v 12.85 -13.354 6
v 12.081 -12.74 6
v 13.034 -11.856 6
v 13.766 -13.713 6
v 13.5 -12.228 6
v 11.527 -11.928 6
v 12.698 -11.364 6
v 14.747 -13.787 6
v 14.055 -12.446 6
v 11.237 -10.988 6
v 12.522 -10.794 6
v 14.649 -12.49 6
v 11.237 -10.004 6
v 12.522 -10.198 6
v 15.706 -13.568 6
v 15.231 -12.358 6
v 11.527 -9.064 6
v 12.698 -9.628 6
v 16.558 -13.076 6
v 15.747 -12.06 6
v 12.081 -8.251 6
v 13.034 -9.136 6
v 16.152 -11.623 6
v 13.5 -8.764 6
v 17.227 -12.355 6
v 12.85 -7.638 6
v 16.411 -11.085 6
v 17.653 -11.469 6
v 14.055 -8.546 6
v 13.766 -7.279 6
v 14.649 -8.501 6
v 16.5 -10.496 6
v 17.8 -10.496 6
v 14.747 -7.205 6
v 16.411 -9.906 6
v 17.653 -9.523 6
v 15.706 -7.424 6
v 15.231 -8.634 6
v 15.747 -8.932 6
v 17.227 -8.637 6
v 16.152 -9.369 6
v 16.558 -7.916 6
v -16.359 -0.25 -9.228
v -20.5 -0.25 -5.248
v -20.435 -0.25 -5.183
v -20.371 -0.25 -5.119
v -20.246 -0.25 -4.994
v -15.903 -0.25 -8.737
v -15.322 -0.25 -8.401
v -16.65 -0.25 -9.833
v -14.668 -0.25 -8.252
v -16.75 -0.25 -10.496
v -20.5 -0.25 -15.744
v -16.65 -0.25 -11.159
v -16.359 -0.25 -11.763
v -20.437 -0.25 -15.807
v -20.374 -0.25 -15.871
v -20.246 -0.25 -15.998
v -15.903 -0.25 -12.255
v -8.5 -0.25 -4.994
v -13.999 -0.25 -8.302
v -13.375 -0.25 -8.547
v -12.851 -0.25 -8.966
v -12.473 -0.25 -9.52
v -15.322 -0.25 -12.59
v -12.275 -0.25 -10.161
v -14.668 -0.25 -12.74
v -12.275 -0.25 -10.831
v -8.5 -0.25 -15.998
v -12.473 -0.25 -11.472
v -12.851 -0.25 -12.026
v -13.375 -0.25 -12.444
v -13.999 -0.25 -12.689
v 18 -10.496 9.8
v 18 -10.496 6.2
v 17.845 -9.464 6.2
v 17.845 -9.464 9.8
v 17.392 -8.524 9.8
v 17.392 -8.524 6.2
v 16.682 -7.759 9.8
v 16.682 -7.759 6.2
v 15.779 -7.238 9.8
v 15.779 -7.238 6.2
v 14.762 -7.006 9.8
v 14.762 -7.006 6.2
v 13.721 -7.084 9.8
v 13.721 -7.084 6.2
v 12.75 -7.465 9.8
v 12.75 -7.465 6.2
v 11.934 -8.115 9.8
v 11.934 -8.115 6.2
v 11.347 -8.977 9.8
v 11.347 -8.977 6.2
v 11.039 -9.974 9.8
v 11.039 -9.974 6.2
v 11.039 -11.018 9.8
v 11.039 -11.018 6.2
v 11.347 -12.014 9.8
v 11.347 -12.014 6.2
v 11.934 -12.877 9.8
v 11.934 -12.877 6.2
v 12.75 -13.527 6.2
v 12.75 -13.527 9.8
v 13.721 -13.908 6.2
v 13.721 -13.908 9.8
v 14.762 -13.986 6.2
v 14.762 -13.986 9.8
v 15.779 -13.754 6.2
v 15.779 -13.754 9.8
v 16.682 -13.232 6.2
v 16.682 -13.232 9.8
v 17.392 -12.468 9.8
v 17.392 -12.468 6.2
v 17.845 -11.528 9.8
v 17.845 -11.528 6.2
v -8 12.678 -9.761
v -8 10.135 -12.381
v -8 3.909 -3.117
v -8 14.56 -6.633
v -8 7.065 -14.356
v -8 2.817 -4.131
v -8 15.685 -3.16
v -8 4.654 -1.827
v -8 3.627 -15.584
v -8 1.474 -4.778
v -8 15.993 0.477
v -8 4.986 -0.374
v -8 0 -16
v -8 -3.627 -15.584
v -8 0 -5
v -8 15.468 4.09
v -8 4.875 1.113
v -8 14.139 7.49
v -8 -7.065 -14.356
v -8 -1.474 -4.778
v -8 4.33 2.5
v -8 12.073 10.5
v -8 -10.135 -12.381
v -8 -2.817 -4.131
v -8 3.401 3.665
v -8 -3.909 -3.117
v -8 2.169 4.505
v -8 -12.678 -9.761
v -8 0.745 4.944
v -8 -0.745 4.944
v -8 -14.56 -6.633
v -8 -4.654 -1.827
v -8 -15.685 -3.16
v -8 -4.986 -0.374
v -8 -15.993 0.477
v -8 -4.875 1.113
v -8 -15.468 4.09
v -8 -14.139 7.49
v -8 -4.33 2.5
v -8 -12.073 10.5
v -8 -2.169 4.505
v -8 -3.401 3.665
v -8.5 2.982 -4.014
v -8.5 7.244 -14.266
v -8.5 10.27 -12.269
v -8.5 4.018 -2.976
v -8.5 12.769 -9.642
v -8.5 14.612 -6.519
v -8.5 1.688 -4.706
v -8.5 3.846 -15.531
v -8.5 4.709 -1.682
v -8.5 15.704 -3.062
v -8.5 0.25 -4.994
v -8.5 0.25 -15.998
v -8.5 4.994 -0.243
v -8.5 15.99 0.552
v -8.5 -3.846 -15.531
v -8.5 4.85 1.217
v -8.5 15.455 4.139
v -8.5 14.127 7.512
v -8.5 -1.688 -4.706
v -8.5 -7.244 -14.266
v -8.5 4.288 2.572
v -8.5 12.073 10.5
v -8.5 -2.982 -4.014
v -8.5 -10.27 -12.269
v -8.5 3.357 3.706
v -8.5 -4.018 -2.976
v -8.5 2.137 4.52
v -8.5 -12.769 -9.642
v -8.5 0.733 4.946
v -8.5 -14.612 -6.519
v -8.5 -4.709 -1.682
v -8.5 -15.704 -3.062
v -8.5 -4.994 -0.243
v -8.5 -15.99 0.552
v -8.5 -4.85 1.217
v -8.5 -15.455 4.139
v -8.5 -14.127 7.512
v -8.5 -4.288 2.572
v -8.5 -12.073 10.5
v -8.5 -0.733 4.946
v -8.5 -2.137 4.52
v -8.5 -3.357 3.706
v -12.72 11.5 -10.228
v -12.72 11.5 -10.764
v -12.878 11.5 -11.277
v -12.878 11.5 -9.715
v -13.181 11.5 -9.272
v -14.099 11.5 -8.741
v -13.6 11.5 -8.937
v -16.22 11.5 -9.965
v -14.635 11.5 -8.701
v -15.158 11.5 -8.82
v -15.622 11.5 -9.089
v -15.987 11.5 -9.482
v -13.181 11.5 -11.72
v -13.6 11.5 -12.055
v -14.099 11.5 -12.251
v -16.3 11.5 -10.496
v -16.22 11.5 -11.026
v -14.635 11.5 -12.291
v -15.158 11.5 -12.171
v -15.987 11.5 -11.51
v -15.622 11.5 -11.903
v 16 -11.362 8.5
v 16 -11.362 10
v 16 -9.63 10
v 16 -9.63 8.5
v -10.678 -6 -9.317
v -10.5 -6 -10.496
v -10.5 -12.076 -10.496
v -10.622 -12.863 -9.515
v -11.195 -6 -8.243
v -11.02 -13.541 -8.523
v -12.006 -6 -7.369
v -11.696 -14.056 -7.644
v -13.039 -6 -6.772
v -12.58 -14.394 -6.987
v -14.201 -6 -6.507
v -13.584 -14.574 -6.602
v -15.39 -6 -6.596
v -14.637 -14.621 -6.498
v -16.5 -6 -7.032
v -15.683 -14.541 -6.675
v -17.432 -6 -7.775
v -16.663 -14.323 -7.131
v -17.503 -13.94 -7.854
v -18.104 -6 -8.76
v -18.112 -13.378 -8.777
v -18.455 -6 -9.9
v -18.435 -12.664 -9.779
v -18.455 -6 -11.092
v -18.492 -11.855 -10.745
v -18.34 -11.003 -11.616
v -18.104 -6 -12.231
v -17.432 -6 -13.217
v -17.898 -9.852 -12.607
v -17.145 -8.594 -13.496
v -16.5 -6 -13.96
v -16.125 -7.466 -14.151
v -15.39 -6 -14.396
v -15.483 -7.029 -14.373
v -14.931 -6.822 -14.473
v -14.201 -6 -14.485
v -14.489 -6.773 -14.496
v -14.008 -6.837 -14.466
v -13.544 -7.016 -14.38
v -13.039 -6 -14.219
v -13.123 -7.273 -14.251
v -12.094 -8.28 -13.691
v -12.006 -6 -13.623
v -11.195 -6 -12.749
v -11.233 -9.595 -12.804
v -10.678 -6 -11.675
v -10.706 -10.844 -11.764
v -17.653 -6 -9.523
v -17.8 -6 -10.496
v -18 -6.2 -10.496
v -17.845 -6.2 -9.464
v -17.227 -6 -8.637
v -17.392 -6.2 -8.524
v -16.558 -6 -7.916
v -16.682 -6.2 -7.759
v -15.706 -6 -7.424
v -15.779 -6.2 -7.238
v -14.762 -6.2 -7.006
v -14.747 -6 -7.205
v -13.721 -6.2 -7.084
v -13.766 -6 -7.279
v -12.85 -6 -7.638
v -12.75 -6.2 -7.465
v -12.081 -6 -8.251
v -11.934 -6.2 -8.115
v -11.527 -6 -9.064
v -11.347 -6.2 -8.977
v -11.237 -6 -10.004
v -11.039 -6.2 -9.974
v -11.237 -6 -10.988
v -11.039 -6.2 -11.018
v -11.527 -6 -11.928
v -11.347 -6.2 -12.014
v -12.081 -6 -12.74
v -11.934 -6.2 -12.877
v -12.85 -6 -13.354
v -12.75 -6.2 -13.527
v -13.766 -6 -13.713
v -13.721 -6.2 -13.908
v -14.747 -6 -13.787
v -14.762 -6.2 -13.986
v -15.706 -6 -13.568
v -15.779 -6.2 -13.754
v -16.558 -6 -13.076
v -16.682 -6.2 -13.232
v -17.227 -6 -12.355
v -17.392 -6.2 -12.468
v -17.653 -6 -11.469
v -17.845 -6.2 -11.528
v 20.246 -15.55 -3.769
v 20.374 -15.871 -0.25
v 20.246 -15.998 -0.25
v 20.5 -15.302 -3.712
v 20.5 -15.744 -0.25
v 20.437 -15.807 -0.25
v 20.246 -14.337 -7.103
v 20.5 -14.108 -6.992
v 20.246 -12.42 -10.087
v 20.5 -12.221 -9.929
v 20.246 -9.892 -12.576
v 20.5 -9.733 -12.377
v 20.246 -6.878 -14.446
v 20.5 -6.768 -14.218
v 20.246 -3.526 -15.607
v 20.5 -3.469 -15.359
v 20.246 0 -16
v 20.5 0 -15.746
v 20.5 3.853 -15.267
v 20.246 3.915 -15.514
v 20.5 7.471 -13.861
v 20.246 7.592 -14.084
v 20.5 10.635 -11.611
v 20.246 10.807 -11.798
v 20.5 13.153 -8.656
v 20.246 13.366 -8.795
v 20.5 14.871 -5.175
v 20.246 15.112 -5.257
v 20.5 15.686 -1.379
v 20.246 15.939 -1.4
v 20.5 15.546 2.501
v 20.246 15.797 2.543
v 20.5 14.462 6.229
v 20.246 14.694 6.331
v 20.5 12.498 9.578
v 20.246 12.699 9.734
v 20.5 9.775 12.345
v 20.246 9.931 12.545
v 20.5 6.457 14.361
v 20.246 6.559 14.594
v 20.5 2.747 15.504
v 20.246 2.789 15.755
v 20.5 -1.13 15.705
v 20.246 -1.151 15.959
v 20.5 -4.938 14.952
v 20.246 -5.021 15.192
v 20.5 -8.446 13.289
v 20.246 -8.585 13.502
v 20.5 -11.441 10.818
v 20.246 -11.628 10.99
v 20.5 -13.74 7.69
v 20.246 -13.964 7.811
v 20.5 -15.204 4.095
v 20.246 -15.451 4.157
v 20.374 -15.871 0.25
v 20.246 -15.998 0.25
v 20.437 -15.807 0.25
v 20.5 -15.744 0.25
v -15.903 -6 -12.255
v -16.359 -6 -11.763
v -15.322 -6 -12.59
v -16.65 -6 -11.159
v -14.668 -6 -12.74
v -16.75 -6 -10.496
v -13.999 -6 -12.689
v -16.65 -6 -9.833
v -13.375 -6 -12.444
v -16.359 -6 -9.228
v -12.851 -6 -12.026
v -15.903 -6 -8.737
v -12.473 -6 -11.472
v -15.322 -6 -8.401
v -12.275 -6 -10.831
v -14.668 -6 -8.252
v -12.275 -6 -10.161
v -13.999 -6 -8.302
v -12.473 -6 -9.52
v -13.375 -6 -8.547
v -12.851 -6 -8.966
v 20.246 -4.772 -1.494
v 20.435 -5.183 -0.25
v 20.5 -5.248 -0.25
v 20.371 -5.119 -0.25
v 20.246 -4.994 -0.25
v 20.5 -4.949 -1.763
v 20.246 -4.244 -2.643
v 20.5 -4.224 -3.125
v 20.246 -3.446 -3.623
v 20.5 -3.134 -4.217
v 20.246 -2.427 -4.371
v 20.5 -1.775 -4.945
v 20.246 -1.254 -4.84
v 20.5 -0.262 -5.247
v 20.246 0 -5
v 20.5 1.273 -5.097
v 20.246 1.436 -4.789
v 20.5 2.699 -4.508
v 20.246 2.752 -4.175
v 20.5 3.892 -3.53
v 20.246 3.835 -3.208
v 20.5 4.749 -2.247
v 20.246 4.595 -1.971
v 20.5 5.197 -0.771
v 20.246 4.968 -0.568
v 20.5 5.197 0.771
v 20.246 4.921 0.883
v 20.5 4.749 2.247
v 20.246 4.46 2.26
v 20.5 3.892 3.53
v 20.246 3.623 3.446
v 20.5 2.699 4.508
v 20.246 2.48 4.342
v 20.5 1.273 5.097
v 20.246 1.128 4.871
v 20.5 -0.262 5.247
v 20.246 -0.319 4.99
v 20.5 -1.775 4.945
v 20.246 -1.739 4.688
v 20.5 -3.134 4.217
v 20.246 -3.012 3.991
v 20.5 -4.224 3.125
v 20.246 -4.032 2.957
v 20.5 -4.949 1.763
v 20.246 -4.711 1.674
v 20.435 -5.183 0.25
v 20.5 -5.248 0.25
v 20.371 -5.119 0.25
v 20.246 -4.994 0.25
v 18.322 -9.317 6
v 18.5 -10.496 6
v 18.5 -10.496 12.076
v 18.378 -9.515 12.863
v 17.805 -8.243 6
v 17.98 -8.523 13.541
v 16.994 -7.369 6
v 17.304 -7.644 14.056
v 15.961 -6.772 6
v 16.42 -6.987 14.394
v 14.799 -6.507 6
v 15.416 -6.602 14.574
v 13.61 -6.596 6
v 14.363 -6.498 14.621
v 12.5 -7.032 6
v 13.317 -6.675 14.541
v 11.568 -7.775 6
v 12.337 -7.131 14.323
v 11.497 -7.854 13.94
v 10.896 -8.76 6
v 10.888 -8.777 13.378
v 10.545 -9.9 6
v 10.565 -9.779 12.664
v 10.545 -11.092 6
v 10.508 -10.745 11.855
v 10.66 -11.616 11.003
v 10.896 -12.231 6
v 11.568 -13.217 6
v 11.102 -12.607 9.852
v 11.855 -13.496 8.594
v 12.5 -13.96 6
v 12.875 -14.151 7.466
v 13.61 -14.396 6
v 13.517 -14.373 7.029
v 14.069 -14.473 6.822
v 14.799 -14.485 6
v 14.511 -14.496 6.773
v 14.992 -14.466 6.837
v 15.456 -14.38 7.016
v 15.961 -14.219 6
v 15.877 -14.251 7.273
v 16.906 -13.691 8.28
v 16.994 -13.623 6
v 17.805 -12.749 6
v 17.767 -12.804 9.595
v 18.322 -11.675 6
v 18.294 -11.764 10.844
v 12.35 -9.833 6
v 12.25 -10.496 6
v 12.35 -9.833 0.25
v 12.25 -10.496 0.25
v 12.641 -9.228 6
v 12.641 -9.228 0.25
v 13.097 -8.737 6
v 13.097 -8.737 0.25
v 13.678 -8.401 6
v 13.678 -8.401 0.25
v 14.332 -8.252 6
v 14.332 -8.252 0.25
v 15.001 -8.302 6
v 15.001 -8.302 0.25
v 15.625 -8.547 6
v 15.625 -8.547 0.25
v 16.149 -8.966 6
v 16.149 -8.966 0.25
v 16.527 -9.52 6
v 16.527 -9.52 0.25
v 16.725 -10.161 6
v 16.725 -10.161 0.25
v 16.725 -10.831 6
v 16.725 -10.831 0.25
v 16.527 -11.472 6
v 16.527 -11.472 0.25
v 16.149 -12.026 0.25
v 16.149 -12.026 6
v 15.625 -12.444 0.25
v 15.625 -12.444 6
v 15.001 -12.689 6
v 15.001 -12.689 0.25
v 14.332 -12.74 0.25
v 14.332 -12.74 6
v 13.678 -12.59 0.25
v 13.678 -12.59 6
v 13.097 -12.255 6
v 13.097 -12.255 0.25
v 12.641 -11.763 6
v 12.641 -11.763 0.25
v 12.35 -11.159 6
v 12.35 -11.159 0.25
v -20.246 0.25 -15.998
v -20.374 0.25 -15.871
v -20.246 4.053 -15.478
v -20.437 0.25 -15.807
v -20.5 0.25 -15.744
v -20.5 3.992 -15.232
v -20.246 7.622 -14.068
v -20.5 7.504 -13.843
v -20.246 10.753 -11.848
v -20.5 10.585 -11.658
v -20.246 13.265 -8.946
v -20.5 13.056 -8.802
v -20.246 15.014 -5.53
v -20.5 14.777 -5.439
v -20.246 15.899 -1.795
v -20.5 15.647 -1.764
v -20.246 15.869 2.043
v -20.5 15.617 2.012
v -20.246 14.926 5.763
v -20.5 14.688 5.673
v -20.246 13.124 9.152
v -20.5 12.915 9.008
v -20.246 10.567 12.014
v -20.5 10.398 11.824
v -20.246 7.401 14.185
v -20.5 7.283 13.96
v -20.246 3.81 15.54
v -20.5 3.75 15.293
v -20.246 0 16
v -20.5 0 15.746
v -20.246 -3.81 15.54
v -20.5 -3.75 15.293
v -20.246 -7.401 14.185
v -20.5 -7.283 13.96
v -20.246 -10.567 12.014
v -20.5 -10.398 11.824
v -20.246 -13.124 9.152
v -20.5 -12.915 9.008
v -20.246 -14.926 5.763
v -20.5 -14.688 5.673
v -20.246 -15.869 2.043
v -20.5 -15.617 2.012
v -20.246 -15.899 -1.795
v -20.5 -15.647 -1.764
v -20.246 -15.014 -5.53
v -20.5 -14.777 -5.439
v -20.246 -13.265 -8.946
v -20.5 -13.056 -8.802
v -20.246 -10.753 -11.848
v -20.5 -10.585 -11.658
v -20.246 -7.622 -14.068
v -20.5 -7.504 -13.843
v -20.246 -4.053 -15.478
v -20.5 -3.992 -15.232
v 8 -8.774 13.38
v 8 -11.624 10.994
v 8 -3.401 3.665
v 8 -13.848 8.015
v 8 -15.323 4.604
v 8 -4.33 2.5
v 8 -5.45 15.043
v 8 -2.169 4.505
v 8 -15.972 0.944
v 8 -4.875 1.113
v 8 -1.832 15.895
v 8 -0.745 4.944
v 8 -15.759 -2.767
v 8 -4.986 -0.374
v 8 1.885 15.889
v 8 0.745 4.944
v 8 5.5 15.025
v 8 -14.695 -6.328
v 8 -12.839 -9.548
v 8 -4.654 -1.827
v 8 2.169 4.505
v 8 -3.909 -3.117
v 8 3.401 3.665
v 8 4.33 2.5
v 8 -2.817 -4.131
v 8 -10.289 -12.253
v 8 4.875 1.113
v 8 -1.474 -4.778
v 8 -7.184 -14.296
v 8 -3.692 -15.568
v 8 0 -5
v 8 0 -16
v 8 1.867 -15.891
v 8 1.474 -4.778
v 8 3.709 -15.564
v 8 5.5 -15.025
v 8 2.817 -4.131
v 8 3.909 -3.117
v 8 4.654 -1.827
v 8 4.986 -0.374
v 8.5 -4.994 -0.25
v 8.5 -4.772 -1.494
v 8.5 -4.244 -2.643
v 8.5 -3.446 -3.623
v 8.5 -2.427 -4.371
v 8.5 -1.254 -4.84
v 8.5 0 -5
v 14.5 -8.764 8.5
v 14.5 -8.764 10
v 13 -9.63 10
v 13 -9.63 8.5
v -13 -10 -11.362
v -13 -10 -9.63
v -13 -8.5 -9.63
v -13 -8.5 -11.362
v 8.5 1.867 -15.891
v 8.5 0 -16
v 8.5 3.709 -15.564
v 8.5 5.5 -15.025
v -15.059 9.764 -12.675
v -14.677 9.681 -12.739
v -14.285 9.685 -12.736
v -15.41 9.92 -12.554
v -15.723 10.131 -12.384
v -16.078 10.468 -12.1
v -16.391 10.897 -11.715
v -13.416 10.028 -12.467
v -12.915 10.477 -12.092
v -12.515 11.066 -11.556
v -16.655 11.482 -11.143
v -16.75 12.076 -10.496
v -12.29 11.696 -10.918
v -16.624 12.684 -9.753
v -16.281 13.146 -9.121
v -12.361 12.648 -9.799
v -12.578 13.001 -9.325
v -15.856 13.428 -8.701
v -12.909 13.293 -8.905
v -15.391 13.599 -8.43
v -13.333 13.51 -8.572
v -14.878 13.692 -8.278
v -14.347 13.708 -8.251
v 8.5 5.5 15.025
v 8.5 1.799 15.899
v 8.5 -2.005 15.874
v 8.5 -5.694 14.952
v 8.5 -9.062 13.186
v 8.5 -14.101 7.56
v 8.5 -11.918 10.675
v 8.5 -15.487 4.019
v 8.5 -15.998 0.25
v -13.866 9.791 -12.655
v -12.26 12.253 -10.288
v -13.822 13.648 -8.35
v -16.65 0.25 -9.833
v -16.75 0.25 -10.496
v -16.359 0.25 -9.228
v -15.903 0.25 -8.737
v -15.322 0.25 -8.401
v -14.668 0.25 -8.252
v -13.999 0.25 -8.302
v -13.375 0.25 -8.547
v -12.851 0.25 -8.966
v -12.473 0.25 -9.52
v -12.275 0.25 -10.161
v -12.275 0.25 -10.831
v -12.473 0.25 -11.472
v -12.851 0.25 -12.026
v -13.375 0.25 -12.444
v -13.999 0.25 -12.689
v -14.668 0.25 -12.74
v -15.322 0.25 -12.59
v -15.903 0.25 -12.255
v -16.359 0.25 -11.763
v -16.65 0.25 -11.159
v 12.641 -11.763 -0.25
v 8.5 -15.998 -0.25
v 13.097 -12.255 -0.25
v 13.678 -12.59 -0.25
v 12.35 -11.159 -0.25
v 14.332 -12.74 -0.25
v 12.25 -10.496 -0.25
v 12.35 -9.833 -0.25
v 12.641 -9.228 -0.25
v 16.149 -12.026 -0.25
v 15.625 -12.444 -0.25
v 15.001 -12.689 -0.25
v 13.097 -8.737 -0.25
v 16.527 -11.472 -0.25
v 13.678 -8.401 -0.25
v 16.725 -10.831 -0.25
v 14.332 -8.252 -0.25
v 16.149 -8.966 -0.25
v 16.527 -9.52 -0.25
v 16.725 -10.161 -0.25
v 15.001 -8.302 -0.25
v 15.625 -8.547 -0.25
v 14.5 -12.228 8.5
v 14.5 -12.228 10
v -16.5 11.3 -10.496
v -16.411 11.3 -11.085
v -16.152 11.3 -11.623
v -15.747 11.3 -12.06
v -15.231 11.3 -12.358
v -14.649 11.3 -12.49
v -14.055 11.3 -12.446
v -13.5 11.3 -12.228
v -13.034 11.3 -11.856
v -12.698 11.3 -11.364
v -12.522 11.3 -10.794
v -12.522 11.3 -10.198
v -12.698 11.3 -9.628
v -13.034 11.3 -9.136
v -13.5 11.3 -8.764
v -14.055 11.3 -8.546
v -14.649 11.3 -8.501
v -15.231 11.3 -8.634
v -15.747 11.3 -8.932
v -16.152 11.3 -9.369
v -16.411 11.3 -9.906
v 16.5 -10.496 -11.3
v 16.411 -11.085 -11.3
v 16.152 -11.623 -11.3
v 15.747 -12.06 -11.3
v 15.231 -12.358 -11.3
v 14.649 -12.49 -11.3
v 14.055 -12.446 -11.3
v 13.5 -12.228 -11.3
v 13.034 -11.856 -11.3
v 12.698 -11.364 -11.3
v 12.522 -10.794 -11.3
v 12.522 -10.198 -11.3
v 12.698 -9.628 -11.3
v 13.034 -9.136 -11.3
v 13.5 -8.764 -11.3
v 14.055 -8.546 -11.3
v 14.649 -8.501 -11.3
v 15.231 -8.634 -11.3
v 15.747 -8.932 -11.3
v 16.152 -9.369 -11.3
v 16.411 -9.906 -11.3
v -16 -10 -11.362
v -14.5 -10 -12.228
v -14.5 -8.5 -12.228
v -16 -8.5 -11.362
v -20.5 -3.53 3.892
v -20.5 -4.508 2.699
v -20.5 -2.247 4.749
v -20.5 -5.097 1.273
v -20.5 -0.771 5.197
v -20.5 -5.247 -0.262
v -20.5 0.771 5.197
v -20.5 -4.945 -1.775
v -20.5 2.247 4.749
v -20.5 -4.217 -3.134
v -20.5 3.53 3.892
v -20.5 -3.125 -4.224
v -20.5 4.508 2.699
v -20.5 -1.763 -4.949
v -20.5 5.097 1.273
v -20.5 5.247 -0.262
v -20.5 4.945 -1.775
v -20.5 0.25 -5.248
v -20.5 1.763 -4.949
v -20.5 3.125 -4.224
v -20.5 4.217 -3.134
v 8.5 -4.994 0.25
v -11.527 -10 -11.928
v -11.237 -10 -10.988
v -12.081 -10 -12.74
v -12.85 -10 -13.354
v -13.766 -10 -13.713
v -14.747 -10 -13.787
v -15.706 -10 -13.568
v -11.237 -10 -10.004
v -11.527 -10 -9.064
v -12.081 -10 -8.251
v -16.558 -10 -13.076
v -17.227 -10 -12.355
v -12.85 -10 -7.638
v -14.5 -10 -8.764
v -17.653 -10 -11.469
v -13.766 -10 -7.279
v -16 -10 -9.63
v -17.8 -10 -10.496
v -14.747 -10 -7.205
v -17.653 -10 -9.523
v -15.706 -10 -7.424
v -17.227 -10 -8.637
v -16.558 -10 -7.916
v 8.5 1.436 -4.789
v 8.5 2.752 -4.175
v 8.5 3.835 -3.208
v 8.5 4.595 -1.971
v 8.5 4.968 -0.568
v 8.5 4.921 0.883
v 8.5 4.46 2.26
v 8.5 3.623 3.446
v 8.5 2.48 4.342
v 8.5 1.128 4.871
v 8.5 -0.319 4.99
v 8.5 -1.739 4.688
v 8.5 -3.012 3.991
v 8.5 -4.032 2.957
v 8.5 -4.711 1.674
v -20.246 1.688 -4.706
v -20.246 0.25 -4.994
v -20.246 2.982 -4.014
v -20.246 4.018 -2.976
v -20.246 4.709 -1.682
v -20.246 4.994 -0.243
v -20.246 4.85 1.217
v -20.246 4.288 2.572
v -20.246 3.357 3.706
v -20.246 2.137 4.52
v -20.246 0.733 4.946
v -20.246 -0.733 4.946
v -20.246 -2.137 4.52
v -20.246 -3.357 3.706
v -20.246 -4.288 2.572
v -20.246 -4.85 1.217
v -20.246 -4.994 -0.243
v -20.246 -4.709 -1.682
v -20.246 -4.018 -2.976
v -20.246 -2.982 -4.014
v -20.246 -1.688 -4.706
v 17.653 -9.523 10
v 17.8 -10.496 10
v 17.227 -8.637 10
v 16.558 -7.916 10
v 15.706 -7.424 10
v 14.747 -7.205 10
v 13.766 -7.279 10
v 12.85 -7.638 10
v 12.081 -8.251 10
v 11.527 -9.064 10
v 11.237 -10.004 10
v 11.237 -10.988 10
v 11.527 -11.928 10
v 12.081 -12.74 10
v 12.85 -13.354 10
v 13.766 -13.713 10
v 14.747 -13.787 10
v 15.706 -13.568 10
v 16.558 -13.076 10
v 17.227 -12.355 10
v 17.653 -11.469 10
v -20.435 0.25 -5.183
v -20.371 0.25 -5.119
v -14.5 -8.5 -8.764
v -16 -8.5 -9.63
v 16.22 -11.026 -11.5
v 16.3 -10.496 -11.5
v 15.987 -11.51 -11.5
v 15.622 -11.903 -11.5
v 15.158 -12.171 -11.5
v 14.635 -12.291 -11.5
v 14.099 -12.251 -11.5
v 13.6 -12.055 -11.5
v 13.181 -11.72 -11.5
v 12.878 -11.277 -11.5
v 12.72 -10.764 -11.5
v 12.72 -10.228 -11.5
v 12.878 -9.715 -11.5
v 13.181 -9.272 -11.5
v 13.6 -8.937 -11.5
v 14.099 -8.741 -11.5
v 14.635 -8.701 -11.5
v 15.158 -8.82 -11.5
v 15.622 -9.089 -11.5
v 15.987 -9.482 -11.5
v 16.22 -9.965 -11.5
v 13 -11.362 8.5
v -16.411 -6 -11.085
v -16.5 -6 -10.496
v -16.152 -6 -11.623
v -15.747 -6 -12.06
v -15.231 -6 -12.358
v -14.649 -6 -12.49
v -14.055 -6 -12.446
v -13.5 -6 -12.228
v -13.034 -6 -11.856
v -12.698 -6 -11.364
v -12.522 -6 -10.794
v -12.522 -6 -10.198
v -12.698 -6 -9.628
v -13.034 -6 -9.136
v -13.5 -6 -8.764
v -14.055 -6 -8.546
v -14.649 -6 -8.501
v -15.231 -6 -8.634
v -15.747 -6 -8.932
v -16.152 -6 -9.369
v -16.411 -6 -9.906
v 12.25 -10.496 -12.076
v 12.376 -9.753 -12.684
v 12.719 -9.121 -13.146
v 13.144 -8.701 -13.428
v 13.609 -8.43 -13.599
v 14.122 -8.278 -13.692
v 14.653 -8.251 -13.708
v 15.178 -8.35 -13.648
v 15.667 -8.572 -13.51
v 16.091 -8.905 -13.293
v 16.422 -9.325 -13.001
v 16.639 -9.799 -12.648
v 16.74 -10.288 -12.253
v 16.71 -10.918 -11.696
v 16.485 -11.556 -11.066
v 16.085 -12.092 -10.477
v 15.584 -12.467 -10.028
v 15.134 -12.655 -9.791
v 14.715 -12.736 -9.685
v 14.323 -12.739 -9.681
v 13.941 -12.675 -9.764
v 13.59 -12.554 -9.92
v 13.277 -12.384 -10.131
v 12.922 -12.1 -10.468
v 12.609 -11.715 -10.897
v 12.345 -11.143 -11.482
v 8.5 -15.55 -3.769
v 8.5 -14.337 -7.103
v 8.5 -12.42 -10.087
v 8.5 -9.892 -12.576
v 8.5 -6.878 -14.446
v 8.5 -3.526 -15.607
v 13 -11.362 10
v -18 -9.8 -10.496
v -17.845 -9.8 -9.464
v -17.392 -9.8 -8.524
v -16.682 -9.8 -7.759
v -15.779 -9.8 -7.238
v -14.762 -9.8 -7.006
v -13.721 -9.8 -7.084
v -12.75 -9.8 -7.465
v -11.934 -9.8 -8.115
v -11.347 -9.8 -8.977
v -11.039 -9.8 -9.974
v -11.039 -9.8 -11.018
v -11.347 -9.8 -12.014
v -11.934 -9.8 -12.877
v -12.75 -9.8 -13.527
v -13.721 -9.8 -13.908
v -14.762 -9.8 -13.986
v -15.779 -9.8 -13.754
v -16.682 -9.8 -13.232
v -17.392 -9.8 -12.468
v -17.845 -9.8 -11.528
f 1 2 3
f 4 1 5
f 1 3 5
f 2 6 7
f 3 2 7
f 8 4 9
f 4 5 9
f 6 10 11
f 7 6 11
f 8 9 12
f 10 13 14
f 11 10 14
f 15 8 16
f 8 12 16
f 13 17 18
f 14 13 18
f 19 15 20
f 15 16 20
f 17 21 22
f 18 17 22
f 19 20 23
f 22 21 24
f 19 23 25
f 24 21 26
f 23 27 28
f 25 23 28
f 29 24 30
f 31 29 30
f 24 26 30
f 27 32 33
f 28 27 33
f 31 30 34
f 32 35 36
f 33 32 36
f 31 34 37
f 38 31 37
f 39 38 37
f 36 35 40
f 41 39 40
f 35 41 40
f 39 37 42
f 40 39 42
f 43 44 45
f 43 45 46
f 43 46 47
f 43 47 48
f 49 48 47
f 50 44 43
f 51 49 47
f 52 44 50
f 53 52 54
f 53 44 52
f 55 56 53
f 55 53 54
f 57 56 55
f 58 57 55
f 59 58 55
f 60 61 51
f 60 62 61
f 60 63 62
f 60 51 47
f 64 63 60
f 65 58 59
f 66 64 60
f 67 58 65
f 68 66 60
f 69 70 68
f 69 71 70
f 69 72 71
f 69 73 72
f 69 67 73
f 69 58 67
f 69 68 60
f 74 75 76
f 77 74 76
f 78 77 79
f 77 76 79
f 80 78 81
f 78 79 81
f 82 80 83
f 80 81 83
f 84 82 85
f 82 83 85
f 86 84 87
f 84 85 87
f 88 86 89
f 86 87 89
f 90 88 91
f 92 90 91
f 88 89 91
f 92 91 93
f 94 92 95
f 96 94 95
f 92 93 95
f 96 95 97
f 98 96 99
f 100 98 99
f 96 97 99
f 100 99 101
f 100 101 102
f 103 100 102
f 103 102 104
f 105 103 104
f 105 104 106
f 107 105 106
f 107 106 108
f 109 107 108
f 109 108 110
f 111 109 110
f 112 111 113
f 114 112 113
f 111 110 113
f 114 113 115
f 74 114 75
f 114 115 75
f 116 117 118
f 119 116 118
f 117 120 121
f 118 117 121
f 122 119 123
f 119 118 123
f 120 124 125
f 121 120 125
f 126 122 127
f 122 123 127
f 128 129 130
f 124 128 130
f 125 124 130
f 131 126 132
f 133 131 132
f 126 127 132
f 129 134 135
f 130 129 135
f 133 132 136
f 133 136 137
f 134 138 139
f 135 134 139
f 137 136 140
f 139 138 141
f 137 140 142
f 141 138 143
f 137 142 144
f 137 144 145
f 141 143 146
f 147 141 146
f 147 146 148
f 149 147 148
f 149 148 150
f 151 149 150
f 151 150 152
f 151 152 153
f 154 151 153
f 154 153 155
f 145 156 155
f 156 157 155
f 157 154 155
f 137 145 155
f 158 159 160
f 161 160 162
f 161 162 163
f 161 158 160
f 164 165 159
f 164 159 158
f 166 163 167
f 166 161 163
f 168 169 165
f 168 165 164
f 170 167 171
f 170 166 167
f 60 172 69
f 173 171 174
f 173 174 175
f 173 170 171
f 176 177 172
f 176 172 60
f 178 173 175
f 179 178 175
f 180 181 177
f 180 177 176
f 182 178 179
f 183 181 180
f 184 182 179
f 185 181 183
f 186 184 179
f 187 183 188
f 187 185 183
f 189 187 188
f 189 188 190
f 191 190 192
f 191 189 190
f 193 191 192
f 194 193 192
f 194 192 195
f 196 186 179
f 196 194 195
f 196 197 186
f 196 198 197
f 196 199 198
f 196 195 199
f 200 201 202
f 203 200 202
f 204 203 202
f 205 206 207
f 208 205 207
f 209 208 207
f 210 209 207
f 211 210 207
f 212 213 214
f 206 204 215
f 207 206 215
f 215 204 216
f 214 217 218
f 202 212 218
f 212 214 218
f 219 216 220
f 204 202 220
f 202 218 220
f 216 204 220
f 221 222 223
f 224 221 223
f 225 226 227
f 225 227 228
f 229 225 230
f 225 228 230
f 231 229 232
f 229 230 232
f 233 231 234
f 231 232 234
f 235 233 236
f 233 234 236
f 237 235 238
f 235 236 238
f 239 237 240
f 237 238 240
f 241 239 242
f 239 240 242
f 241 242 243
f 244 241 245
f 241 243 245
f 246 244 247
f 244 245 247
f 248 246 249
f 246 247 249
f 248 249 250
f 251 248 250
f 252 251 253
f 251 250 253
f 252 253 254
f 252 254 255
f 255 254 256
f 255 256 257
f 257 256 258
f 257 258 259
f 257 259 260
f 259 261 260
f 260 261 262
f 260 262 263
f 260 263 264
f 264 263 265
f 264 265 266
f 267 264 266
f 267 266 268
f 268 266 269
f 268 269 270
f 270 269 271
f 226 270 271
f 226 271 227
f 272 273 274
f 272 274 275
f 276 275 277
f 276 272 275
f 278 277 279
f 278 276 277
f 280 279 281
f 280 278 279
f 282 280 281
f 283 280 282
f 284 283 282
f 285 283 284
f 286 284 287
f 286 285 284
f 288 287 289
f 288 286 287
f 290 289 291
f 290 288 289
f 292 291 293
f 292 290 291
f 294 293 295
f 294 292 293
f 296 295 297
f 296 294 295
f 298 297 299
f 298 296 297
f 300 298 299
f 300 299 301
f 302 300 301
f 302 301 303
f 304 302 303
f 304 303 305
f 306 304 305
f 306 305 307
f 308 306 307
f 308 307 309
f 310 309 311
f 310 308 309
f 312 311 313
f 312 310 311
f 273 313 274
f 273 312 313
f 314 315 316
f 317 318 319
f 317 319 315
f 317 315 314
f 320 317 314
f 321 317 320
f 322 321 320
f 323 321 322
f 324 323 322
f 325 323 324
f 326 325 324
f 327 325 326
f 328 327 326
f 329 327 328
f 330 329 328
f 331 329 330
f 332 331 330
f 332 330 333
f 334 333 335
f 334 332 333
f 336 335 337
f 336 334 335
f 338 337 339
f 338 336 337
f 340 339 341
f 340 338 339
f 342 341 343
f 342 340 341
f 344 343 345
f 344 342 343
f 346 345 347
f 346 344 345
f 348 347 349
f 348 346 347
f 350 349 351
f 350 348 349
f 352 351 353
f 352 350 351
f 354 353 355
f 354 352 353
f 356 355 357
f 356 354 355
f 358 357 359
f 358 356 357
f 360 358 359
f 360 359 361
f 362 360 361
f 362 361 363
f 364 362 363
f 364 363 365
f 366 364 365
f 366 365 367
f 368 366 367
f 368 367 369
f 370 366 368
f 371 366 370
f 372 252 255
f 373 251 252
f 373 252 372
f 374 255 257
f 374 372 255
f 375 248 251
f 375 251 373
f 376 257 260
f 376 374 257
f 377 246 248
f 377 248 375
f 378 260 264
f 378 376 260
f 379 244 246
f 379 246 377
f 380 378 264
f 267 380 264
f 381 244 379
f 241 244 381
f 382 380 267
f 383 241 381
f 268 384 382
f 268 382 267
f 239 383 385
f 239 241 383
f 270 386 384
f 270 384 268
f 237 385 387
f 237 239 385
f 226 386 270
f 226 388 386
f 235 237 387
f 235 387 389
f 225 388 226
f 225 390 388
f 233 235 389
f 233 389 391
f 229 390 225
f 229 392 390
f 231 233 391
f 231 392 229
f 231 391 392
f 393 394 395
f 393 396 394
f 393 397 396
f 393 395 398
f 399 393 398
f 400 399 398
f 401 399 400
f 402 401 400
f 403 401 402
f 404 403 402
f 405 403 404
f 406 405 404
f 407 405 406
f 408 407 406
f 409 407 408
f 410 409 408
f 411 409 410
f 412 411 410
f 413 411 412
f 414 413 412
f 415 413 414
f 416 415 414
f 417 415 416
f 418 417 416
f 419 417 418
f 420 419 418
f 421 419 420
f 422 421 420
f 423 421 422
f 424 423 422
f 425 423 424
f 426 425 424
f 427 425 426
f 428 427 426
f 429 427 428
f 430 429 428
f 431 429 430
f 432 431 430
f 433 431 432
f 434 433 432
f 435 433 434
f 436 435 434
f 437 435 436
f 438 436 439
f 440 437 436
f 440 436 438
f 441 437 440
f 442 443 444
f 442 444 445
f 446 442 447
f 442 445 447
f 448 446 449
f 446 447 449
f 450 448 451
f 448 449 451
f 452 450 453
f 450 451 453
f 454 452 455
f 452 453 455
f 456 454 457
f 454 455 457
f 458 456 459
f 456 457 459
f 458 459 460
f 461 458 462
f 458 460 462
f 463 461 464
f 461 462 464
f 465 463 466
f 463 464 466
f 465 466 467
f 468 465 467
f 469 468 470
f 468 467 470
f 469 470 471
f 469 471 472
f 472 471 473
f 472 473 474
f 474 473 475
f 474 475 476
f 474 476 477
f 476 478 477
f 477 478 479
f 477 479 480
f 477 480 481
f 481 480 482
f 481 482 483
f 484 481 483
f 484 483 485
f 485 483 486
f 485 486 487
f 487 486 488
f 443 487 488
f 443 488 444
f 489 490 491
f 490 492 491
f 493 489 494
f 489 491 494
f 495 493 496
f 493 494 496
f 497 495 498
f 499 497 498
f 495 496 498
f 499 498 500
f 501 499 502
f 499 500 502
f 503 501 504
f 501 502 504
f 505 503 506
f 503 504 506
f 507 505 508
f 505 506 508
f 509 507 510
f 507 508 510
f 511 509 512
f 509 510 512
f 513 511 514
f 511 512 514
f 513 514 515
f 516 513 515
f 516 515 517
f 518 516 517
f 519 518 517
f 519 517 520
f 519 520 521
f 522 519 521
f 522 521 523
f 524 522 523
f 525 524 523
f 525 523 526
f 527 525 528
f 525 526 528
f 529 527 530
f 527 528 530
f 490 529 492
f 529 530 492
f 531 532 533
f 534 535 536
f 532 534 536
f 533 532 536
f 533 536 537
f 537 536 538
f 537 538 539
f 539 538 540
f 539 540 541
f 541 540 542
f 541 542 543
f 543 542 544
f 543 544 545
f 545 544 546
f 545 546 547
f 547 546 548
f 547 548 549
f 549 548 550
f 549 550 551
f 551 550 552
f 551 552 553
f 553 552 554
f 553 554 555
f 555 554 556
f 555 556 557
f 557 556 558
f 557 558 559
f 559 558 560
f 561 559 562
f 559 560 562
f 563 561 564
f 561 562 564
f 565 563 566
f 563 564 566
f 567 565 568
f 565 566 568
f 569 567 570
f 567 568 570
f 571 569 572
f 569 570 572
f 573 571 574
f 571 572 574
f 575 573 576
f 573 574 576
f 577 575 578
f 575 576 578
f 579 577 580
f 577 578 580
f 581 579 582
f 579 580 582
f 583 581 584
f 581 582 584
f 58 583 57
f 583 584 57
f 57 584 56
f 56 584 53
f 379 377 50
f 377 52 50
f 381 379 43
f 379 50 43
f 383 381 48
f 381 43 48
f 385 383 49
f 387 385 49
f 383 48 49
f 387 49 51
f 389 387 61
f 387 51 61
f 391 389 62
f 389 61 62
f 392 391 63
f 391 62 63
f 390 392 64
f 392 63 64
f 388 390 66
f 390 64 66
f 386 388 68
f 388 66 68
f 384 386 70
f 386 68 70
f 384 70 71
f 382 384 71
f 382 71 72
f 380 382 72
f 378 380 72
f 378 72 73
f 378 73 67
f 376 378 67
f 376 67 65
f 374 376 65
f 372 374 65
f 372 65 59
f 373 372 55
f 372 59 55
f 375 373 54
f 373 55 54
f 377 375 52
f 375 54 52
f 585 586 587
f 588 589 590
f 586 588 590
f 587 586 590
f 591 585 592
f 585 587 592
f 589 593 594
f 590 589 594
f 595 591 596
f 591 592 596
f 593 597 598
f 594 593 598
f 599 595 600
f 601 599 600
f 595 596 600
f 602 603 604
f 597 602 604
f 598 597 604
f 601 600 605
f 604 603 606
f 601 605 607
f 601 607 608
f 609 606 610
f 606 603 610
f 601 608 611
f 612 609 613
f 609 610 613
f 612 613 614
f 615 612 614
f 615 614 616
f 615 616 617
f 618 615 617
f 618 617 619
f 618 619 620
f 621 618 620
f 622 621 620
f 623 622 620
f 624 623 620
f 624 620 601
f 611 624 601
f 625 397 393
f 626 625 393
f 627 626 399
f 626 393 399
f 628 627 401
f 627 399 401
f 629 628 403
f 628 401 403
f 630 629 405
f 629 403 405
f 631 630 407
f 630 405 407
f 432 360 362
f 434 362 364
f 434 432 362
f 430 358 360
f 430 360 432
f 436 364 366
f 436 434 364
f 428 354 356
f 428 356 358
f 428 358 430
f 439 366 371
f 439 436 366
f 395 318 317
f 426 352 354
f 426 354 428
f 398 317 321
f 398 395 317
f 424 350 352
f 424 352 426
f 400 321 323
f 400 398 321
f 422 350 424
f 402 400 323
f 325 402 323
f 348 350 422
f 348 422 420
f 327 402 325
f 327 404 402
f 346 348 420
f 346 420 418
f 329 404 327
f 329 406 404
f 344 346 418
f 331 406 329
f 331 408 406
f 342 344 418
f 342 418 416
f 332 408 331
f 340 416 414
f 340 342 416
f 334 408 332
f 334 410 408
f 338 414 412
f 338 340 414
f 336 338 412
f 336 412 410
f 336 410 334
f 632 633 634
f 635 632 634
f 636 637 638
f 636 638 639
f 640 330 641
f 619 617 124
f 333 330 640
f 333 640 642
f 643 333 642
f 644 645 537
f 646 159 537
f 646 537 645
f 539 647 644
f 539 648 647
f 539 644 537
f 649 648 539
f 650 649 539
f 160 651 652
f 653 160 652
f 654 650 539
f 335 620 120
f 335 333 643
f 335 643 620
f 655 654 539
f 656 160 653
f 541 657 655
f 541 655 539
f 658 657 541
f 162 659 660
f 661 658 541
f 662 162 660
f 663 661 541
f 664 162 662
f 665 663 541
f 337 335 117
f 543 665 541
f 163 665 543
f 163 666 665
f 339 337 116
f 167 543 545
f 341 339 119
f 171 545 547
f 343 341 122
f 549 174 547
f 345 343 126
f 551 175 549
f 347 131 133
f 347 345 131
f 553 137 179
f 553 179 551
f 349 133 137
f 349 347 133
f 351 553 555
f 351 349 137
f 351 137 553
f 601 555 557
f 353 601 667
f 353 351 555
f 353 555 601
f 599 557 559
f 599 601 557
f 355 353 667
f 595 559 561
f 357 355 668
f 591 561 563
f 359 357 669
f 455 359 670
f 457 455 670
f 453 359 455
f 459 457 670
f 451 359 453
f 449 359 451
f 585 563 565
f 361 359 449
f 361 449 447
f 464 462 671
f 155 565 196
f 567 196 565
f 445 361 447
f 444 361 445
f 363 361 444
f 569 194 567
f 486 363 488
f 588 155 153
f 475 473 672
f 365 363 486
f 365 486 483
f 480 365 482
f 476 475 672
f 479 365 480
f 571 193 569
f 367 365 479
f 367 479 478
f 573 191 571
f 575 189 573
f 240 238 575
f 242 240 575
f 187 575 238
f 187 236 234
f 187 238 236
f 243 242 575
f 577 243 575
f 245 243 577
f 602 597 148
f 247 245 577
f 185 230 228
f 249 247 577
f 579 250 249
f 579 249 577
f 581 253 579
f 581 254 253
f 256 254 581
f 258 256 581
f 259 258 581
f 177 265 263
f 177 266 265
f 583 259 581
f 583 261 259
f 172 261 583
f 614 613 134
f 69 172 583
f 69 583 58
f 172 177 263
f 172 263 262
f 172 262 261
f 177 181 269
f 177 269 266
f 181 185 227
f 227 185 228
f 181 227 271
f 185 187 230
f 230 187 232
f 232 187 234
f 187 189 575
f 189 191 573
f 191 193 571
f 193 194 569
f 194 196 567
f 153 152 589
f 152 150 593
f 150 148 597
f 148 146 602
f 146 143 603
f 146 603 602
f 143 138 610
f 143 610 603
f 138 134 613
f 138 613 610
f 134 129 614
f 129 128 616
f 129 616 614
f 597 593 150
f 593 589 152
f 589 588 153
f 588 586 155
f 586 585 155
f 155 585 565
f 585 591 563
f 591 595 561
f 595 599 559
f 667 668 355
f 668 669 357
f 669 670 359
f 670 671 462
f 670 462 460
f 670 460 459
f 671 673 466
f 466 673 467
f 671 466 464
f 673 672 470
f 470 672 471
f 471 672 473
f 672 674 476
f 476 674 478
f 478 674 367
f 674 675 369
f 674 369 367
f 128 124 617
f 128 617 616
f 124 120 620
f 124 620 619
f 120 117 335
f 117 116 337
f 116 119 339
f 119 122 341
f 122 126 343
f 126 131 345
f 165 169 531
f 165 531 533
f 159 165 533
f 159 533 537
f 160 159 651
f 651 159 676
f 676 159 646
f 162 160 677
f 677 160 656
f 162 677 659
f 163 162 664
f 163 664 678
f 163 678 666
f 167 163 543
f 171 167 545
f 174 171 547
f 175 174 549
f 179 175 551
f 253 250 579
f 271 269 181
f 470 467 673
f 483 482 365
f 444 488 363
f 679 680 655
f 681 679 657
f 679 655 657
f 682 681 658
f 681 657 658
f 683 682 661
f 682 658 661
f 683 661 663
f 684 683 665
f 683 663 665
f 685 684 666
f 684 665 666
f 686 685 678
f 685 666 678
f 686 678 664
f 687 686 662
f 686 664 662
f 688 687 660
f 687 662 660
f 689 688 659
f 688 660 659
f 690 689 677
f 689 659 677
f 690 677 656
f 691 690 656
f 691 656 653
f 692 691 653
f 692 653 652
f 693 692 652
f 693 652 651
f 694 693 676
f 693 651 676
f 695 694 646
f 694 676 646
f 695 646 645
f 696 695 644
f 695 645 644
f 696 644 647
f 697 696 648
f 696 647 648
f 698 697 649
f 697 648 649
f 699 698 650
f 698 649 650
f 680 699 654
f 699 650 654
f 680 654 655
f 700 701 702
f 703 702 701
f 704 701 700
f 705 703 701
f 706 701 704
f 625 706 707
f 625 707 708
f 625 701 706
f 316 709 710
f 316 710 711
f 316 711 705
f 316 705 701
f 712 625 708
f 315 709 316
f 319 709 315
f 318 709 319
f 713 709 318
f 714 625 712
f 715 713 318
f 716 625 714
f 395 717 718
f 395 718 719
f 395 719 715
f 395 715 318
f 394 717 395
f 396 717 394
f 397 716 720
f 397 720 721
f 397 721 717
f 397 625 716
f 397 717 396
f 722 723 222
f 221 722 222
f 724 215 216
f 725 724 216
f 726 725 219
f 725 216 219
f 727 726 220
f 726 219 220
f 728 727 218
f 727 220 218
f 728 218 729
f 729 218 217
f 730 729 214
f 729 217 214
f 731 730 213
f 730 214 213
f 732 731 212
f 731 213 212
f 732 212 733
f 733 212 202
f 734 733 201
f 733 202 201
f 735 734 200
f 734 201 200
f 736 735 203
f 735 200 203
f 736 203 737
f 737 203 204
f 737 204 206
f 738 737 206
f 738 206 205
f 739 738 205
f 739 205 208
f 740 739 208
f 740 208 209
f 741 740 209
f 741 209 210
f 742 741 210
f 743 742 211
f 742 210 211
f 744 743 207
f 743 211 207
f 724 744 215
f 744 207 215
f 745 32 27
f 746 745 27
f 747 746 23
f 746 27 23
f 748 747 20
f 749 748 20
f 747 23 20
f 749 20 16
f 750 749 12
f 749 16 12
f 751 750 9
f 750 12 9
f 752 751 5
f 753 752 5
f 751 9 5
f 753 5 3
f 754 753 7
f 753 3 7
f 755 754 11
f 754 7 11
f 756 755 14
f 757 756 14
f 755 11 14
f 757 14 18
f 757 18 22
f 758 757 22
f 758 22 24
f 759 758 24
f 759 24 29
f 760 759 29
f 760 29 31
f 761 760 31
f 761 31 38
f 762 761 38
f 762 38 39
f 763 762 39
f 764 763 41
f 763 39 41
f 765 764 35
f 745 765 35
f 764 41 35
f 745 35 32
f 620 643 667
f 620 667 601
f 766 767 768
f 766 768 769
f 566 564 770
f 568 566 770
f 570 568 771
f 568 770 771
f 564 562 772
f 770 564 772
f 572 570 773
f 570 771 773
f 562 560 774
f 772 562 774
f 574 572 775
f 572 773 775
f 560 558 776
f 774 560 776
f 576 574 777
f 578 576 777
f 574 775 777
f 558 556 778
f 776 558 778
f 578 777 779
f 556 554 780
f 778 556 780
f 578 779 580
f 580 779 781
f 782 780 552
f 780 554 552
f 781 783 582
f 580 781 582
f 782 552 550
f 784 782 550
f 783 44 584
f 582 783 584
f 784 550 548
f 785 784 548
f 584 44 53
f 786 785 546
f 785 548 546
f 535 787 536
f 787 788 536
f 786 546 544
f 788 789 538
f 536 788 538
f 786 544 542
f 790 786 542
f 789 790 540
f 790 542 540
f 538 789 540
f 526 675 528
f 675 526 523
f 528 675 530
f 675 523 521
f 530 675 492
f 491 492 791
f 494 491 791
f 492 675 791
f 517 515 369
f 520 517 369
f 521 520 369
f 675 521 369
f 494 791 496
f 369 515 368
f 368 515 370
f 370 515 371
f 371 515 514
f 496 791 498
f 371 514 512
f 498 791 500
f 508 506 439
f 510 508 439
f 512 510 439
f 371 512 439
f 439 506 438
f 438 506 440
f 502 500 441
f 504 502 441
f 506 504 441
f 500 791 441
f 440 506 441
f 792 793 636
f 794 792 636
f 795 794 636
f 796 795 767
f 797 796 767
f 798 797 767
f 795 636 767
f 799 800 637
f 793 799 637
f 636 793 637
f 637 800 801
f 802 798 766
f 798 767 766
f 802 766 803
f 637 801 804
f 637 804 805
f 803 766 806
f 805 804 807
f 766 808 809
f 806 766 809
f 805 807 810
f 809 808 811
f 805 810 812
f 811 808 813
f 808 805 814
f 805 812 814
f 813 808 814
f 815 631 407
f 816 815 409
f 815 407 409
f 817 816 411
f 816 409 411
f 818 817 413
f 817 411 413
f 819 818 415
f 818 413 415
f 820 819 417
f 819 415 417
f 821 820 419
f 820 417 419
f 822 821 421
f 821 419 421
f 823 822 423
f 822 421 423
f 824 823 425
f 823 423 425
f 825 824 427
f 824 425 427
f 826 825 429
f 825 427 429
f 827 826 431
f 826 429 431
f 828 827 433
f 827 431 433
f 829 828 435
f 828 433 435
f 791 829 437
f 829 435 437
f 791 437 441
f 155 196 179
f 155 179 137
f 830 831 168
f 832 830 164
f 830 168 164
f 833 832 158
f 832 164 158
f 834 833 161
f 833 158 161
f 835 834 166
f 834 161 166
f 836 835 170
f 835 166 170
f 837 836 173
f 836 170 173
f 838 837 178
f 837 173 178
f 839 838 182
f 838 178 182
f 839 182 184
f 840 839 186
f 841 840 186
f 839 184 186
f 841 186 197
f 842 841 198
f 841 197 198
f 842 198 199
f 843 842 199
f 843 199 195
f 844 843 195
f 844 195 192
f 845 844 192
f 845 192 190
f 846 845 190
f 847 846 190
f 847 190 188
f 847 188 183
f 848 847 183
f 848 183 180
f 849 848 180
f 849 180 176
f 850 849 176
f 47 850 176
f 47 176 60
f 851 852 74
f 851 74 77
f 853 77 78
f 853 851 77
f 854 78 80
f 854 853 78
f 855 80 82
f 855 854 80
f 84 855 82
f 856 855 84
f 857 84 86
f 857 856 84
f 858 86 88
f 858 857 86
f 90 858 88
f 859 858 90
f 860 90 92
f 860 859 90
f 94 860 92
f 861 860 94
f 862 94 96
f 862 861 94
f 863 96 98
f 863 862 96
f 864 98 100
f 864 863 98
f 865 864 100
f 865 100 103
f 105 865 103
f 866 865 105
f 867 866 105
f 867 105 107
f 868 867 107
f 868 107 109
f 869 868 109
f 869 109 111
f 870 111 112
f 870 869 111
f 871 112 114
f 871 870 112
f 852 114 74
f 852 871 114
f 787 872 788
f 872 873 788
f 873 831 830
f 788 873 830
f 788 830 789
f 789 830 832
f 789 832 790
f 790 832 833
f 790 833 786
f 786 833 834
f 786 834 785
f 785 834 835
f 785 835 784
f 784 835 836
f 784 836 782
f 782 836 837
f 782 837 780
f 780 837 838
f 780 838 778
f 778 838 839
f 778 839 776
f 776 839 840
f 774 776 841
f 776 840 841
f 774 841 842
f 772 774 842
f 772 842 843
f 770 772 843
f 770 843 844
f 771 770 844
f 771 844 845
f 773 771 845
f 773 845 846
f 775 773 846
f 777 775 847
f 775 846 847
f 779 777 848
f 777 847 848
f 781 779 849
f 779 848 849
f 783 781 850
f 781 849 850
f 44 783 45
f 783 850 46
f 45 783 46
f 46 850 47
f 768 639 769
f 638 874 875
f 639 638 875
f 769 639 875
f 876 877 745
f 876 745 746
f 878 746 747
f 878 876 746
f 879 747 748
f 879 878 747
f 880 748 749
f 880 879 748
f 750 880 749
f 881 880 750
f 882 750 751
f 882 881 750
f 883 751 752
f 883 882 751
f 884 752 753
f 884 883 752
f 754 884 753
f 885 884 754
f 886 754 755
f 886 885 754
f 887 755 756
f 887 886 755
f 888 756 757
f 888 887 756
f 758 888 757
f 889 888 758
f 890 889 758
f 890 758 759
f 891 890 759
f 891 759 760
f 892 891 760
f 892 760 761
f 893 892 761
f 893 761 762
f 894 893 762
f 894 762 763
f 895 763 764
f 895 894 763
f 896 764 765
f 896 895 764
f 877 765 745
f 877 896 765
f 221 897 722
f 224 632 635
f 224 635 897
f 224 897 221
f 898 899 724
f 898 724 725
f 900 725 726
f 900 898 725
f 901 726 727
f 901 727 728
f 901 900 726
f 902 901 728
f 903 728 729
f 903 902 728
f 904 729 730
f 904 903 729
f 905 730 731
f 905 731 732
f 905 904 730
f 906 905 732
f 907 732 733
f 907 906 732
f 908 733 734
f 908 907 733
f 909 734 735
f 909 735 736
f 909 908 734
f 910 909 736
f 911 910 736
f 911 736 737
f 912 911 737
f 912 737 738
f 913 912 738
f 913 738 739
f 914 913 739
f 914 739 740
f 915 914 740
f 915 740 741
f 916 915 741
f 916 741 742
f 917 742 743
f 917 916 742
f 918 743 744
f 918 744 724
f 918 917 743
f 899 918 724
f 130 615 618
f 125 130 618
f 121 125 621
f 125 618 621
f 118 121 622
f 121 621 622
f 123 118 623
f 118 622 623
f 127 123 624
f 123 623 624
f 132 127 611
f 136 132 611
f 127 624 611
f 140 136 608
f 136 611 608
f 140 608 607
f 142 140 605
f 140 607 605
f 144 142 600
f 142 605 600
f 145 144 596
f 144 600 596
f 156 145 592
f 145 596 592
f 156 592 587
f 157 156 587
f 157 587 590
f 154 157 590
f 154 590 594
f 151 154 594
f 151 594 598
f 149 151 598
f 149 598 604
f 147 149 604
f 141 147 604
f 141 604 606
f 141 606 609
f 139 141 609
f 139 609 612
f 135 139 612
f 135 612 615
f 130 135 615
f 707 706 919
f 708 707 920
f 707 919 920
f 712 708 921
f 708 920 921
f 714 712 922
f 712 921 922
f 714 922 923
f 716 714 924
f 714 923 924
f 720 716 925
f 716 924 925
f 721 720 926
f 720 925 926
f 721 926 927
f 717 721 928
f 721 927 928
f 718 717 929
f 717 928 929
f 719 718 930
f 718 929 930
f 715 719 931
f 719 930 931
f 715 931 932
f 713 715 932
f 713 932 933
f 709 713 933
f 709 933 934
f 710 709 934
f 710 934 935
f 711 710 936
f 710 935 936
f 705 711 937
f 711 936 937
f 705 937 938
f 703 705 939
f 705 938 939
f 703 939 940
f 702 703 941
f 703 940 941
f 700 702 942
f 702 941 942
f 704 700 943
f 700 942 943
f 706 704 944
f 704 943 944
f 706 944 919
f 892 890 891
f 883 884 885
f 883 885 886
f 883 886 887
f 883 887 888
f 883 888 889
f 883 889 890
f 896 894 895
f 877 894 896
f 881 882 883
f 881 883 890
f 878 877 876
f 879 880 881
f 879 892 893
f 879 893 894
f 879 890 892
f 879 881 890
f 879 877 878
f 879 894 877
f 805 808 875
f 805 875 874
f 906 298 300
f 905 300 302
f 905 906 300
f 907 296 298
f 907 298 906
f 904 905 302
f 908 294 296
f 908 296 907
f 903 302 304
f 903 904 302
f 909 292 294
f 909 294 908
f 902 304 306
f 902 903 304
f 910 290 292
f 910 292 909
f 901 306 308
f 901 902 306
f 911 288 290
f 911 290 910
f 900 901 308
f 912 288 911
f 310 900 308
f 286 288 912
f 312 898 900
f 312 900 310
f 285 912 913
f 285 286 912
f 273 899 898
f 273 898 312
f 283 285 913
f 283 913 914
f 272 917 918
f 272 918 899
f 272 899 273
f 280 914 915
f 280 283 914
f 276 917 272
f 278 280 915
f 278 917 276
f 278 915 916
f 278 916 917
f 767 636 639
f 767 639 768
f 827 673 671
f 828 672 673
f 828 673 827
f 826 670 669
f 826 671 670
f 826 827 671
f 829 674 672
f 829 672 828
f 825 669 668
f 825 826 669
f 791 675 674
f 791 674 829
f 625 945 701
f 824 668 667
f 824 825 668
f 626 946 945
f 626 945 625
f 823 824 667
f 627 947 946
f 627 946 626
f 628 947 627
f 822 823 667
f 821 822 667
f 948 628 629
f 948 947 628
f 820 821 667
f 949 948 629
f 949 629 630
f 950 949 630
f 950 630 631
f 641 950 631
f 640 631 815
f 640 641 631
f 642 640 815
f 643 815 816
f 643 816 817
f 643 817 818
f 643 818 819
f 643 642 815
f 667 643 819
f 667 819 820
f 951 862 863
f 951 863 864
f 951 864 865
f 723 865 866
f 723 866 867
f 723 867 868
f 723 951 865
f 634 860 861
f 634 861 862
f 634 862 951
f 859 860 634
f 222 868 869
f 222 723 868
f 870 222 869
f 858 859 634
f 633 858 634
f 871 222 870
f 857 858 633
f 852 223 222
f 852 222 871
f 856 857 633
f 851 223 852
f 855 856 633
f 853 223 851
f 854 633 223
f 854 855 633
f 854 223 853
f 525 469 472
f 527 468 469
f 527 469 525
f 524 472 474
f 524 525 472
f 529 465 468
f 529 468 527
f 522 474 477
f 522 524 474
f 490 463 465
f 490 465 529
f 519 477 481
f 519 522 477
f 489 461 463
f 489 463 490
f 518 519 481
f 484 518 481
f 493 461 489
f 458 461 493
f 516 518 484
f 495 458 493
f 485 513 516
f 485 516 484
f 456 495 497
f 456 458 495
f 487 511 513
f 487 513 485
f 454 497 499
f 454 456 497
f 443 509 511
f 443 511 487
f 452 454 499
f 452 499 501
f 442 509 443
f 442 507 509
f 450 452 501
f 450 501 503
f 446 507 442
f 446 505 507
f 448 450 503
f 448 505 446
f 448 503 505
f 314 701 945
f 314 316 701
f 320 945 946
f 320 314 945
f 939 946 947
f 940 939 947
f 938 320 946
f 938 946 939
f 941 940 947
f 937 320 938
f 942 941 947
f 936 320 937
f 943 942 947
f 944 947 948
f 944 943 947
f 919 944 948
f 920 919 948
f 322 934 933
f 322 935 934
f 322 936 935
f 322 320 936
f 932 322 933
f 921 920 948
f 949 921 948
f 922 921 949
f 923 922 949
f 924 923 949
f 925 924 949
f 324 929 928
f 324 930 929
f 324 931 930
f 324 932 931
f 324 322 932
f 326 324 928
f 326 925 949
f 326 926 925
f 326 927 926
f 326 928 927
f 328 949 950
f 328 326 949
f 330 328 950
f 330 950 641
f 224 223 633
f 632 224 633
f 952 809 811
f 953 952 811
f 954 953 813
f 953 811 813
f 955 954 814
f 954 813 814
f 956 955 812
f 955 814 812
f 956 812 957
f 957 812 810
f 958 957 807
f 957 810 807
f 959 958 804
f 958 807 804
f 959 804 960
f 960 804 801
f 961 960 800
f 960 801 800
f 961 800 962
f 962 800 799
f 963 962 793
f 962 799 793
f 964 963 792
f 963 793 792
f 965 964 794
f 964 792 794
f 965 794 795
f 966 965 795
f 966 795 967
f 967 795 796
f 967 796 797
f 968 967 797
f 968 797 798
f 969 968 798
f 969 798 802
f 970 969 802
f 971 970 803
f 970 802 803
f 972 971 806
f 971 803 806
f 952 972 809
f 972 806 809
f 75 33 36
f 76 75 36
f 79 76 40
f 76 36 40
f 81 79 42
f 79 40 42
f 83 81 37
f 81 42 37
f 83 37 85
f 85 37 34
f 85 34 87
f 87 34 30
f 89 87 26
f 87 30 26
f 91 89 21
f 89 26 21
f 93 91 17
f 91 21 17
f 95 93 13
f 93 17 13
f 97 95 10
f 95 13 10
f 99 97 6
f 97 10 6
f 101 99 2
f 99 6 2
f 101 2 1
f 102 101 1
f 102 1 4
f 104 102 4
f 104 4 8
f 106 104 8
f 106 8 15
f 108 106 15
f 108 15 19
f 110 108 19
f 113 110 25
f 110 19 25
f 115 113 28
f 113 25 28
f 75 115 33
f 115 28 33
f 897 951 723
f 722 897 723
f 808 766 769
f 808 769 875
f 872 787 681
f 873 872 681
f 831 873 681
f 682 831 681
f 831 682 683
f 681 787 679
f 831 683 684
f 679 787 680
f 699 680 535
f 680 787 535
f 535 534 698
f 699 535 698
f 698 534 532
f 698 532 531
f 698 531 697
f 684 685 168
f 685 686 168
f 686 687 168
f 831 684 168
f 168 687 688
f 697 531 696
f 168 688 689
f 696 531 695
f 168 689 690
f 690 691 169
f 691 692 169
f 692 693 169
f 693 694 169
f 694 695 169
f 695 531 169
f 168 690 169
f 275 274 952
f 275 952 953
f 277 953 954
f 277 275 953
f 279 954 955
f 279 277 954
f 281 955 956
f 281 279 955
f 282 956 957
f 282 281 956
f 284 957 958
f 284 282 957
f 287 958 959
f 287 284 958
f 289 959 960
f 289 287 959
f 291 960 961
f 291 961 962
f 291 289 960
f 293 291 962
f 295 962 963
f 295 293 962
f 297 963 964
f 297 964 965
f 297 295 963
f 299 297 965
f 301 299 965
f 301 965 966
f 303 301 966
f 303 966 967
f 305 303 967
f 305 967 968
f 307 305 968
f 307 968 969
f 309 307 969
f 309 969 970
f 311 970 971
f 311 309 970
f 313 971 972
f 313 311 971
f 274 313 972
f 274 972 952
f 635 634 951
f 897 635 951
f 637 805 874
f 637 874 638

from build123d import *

# Parameters (mm, degrees)
SKETCH1_R                      = 16
BOSS_EXTRUDE1_DEPTH            = 20.5
SKETCH2_R                      = 5
CUT_EXTRUDE1_DEPTH             = 42
CHAMFER1_SIZE                  = 0.254
SKETCH4_W                      = 0.5
SKETCH4_H                      = 26.5
CUT_EXTRUDE2_DEPTH             = 33
SKETCH7_W                      = 0.5
SKETCH7_H                      = 21.5
CUT_EXTRUDE3_DEPTH             = 33
SKETCH8_W                      = 12
SKETCH8_H                      = 16
CUT_EXTRUDE5_DEPTH             = 0.25
SKETCH13_W                     = 12
SKETCH13_H                     = 16
CUT_EXTRUDE6_DEPTH             = 0.25
CBORE_FOR_M4_SHCS1_D           = 4.5
CBORE_FOR_M4_SHCS1_CBORE_D     = 8
CBORE_FOR_M4_SHCS1_CBORE_DEPTH = 10
CBORE_FOR_M4_SHCS2_D           = 4.5
CBORE_FOR_M4_SHCS2_CBORE_D     = 8
CBORE_FOR_M4_SHCS2_CBORE_DEPTH = 10
SKETCH16_R                     = 3.5
BOSS_EXTRUDE2_DEPTH            = 4
SKETCH17_R                     = 2
BOSS_EXTRUDE3_DEPTH            = 17.5
CHAMFER2_SIZE                  = 0.2
CUT_EXTRUDE7_DEPTH             = 1.5
CIRPATTERN1_COUNT              = 2
CIRPATTERN1_ANGLE              = 90


with BuildPart() as part:
    # Sketch1 → Boss-Extrude1 (new body, symmetric)
    with BuildSketch(Plane(origin=(0, 0, 0), x_dir=(0, 0, -1), z_dir=(1, 0, 0))):
        Circle(SKETCH1_R)
    extrude(amount=BOSS_EXTRUDE1_DEPTH, both=True)

    # Sketch2 → Cut-Extrude1 (cut, through all)
    with BuildSketch(Plane(origin=(20.5, 0, 0), x_dir=(0, 0, -1), z_dir=(1, 0, 0))):
        Circle(SKETCH2_R)
    extrude(amount=-CUT_EXTRUDE1_DEPTH, mode=Mode.SUBTRACT)

    # Chamfer1
    chamfer1_edges = [part.edges().sort_by_distance(p)[0] for p in [
        (-20.5, 0, 16),
        (20.5, 0, 16),
        (-20.5, 0, 5),
        (20.5, 0, 5),
    ]]
    chamfer(chamfer1_edges, length=CHAMFER1_SIZE)

    # Sketch4 → Cut-Extrude2 (cut, through all)
    with BuildSketch(Plane.XZ.offset(16)):
        with Locations((-8.25, -2.75)):
            Rectangle(SKETCH4_W, SKETCH4_H)
    extrude(amount=-CUT_EXTRUDE2_DEPTH, mode=Mode.SUBTRACT)

    # Sketch7 → Cut-Extrude3 (cut, through all)
    with BuildSketch(Plane(origin=(0, 0, -16), x_dir=(-1, 0, 0), z_dir=(0, 0, -1))):
        with Locations((-8.25, -5.25)):
            Rectangle(SKETCH7_W, SKETCH7_H)
    extrude(amount=-CUT_EXTRUDE3_DEPTH, mode=Mode.SUBTRACT)

    # Sketch8 → Cut-Extrude5 (cut, symmetric)
    with BuildSketch(Plane(origin=(0, 0, 0), x_dir=(1, 0, 0), z_dir=(0, 1, 0))):
        with Locations((-14.5, 8)):
            Rectangle(SKETCH8_W, SKETCH8_H)
    extrude(amount=CUT_EXTRUDE5_DEPTH, both=True, mode=Mode.SUBTRACT)

    # Sketch13 → Cut-Extrude6 (cut, symmetric)
    with BuildSketch(Plane.XY):
        with Locations((14.5, -8)):
            Rectangle(SKETCH13_W, SKETCH13_H)
    extrude(amount=CUT_EXTRUDE6_DEPTH, both=True, mode=Mode.SUBTRACT)

    # CBORE for M4 SHCS1 (through all)
    with Locations(Plane.XZ.offset(16)):
        with Locations((-14.5, -10.495896422)):
            CounterBoreHole(CBORE_FOR_M4_SHCS1_D / 2, CBORE_FOR_M4_SHCS1_CBORE_D / 2, CBORE_FOR_M4_SHCS1_CBORE_DEPTH)

    # CBORE for M4 SHCS2 (through all)
    with Locations(Plane.XY.offset(16)):
        with Locations((14.5, -10.495896422)):
            CounterBoreHole(CBORE_FOR_M4_SHCS2_D / 2, CBORE_FOR_M4_SHCS2_CBORE_D / 2, CBORE_FOR_M4_SHCS2_CBORE_DEPTH)


with BuildPart() as body_2:
    # Sketch16 → Boss-Extrude2 (new body)
    with BuildSketch(Plane.XY.offset(6)):
        with Locations((14.5, -10.495896422)):
            Circle(SKETCH16_R)
    extrude(amount=BOSS_EXTRUDE2_DEPTH)

    # Sketch17 → Boss-Extrude3 (add)
    with BuildSketch(Plane(origin=(0, 0, 6), x_dir=(-1, 0, 0), z_dir=(0, 0, -1))):
        with Locations(Location((-14.5, -10.495896422, 0), (0, 0, 180))):  # turned: the seam where the file's is
            Circle(SKETCH17_R)
    extrude(amount=BOSS_EXTRUDE3_DEPTH)

    # Chamfer2
    chamfer2_edges = [body_2.edges().sort_by_distance(p)[0] for p in [
        (11, -10.495896422, 6),
        (11, -10.495896422, 10),
        (12.5, -10.495896422, -11.5),
    ]]
    chamfer(chamfer2_edges, length=CHAMFER2_SIZE)

    # Sketch18 → Cut-Extrude7 (cut)
    with BuildSketch(Plane.XY.offset(10)):
        Polygon((14.5, -12.22794723), (16, -11.361921826), (16, -9.629871019), (14.5, -8.763845615), (13, -9.629871019), (13, -11.361921826), align=None)
    extrude(amount=-CUT_EXTRUDE7_DEPTH, mode=Mode.SUBTRACT)


with BuildPart() as body_3:
    # Mirror1: mirrored copy
    add(body_2.part.mirror(Plane(origin=(0, 0, 0), x_dir=(0, 0, 1), z_dir=(1, 0, 0))))


with BuildPart() as cirpattern1_1:
    # CirPattern1: pattern copy
    add(body_3.part.rotate(Axis((0, 0, 0), (1, 0, 0)), 1 * CIRPATTERN1_ANGLE / (CIRPATTERN1_COUNT - 1)))


solid = Compound([part.part, body_2.part, cirpattern1_1.part])
